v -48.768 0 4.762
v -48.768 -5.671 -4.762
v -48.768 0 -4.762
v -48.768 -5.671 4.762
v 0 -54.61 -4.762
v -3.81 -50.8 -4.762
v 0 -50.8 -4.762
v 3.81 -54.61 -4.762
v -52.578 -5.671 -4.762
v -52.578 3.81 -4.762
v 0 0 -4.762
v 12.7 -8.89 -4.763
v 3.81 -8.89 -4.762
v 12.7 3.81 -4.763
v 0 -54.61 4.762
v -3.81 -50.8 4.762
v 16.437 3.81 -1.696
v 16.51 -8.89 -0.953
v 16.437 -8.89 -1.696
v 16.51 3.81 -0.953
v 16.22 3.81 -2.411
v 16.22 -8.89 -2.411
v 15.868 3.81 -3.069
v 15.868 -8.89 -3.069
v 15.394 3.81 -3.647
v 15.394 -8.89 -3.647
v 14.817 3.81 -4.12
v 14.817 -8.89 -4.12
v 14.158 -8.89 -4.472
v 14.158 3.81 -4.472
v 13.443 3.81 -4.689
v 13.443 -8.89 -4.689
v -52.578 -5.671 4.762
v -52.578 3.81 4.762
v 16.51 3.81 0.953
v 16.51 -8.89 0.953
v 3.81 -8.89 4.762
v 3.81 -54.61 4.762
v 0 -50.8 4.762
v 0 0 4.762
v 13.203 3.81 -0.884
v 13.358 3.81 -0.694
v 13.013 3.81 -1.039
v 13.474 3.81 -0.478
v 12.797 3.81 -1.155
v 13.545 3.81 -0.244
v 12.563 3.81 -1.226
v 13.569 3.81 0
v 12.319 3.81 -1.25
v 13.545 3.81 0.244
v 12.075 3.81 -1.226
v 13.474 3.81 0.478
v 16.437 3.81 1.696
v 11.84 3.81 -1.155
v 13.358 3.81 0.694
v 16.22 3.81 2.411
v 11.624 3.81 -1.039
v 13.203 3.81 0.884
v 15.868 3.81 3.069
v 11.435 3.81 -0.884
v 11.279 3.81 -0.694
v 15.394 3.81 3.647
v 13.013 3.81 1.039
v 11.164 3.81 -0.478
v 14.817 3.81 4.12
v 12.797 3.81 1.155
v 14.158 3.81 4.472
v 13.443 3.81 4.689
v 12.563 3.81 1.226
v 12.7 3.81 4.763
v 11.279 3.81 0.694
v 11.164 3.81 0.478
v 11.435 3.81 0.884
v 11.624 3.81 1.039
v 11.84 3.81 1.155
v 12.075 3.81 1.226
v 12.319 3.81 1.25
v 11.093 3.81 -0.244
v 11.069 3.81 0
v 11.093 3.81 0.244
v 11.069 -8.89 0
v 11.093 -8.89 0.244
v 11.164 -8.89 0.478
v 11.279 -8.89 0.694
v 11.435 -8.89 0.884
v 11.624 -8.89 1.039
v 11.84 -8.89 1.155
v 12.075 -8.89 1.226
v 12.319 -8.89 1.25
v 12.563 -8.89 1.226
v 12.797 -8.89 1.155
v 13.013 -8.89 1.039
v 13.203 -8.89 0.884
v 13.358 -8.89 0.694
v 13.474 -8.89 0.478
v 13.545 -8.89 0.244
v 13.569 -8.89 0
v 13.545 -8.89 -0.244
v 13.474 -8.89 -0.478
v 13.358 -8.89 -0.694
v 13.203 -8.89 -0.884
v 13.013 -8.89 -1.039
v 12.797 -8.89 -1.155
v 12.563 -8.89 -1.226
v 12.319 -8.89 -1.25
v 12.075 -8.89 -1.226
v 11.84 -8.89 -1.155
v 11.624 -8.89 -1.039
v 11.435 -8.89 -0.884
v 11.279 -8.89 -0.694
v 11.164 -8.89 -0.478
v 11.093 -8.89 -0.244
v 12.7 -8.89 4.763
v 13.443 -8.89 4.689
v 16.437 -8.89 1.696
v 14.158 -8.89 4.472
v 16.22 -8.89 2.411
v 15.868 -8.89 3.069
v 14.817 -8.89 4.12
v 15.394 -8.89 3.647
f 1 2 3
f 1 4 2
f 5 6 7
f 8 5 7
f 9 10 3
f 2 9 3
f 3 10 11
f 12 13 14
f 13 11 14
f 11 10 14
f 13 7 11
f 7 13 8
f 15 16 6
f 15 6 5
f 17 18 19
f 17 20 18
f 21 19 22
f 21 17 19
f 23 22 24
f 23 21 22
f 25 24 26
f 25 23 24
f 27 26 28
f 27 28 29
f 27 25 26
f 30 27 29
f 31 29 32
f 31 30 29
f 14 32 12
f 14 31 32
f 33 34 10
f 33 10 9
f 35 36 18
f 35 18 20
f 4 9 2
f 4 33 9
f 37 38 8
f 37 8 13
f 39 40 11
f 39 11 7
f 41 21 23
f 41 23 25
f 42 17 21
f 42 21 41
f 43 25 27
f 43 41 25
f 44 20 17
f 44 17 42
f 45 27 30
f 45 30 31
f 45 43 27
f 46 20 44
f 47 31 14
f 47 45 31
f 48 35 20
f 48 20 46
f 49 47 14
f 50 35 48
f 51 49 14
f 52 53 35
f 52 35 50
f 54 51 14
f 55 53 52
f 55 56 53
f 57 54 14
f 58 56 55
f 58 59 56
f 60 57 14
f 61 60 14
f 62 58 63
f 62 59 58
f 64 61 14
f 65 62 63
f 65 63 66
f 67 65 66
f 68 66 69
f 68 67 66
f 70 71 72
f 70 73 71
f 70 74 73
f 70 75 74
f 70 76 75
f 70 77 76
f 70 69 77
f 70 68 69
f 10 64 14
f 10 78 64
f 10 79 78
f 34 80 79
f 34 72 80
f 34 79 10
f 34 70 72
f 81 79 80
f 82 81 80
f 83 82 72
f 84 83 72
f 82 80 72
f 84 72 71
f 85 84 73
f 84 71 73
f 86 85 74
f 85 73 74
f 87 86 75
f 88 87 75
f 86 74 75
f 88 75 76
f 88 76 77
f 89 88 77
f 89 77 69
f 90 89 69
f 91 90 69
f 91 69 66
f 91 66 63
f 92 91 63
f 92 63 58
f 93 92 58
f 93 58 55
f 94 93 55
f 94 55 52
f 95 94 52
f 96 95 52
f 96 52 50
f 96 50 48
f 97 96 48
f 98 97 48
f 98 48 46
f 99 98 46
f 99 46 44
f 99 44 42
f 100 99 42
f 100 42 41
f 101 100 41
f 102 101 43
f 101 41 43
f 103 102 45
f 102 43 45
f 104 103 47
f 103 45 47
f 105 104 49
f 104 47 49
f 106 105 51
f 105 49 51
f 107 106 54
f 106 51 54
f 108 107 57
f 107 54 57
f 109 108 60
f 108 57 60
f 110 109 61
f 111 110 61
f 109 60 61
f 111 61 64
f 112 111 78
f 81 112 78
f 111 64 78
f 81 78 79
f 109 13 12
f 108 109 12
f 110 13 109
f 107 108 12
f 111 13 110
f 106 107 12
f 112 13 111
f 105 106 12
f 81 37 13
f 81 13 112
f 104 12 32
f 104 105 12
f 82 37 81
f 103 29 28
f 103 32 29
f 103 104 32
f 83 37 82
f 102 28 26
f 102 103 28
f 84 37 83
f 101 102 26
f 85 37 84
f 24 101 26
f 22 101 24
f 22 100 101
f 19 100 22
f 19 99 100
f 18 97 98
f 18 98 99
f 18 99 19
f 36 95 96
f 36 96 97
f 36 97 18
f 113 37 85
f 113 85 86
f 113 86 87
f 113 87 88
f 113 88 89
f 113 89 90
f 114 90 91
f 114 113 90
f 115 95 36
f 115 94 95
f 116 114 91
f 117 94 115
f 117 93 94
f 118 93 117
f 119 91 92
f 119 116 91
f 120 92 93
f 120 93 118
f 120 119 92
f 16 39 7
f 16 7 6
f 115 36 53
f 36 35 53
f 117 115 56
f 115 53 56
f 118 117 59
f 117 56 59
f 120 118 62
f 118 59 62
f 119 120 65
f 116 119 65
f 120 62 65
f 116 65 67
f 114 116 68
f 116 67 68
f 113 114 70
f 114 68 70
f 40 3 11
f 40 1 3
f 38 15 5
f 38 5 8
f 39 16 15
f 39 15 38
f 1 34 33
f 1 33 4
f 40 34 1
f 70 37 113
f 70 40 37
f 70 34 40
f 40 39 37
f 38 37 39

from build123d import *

# Parameters (mm, degrees)
F0_W     = 12.7
F0_H     = 12.7
F1_DEPTH = 4.7625
F2_R     = 3.81
F3_R     = 1.25
F4_DEPTH = 58.421


with BuildPart() as f1:
    # F0 (on Top) → F1 (new body, symmetric)
    with BuildSketch(Plane.XY):
        Polygon((-48.768, 0), (0, 0), (0, -50.8), (3.81, -50.8), (3.81, -8.89), (3.81, 3.81), (-52.578, 3.81), (-52.578, -5.671398), (-48.768, -5.671398), align=None)
        Polygon((3.81, -50.8), (0, -50.8), (-3.81, -50.8), (0, -54.61), (3.81, -54.61), align=None)
        with Locations((10.16, -2.54)):
            Rectangle(F0_W, F0_H)
    extrude(amount=F1_DEPTH, both=True)

    # F2
    f2_edges = [f1.edges().sort_by_distance(p)[0] for p in [
        (16.51, -2.54, -4.7625),
        (16.51, -2.54, 4.7625),
    ]]
    fillet(f2_edges, radius=F2_R)

    # F3 (on face) → F4 (cut, through all)
    with BuildSketch(Plane(origin=(0, 3.81, 0), x_dir=(-1, 0, 0), z_dir=(0, 1, 0))):
        with Locations((-12.318778, 0)):
            Circle(F3_R)
    extrude(amount=-F4_DEPTH, mode=Mode.SUBTRACT)


solid = f1.part
